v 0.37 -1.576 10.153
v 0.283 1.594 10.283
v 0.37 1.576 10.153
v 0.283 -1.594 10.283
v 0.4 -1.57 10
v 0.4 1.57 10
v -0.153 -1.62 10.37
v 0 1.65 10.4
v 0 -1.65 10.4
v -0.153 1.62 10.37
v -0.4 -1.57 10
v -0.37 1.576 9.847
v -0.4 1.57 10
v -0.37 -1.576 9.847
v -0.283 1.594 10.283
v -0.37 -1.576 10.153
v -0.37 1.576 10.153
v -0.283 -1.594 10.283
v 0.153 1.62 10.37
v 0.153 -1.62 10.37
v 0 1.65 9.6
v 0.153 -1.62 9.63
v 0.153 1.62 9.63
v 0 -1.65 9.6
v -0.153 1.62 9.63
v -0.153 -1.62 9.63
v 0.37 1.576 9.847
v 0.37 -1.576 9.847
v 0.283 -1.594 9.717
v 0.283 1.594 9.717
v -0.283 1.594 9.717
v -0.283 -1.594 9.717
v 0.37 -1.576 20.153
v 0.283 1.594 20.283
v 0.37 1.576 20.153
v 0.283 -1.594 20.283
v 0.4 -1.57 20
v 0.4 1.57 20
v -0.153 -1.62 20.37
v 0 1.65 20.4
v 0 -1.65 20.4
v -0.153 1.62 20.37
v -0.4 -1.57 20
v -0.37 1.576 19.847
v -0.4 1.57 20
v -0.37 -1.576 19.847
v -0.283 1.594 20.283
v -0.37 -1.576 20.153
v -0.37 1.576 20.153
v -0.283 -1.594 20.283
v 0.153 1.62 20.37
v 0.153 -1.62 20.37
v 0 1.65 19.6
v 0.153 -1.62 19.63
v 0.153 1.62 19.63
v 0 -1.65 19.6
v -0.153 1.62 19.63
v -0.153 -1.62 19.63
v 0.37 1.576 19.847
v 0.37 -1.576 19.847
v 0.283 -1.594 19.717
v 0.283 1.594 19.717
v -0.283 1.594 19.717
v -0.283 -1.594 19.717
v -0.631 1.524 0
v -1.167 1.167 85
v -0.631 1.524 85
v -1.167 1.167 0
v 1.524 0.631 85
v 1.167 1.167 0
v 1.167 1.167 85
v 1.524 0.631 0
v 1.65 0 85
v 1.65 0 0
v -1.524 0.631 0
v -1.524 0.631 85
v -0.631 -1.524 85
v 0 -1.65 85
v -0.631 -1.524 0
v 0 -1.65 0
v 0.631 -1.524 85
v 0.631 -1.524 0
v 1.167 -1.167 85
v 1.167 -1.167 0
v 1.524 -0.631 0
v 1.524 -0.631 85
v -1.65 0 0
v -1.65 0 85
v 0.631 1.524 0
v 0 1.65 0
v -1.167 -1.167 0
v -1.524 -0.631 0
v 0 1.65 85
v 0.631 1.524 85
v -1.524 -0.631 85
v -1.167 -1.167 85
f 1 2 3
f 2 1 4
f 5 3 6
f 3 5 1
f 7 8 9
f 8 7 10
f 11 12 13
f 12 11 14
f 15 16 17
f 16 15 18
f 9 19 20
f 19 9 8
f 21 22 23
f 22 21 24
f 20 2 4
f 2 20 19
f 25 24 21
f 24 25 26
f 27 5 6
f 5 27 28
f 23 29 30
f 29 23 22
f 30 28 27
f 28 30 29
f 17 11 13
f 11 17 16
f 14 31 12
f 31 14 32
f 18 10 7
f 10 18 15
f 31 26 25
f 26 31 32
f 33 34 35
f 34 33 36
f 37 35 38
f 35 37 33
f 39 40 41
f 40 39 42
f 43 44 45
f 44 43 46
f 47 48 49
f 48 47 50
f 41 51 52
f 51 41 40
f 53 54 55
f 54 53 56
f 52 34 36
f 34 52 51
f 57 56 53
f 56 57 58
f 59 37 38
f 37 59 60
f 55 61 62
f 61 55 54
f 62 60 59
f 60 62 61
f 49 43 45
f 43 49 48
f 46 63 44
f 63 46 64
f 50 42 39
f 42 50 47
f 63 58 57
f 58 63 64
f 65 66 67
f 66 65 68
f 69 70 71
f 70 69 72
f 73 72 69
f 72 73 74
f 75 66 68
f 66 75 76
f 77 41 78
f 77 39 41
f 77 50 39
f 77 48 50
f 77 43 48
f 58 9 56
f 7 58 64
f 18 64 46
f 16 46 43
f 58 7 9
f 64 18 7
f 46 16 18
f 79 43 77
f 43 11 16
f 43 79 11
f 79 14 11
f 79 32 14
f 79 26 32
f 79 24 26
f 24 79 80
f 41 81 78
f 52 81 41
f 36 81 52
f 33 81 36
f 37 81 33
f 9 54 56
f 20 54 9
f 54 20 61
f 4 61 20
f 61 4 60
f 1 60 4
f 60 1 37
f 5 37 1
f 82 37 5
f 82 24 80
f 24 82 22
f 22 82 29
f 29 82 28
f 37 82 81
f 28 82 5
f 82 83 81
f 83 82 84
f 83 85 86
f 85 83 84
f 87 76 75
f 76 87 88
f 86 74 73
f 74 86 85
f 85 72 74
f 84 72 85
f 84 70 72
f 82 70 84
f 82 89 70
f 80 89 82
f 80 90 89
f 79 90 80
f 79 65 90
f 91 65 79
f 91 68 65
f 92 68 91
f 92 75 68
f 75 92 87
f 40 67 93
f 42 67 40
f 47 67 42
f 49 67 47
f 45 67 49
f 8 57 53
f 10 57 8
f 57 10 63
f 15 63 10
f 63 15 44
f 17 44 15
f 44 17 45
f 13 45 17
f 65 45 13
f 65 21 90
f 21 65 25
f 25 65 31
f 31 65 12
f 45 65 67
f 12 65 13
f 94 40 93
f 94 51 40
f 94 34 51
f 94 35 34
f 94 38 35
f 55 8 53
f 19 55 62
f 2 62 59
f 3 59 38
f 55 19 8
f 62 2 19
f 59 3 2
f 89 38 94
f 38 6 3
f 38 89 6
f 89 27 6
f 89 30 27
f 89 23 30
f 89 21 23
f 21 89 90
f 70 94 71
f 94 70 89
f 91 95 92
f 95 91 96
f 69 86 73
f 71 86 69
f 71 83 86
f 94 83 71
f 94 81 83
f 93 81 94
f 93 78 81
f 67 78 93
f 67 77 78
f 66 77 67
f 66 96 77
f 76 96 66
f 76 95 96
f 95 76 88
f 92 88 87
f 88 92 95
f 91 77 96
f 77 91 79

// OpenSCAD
// file: hdim.scad
module hdim(x1 = 10, x2 = 20, y = 10, dimline_lenght = 9.0) 
{
    dimline_overlap = 0.5;
    dimline_width = 0.3;
    text_size = 2;
    tmp = 2*dimline_overlap+text_size/2;
    text_pos = dimline_lenght>0 ? tmp : -tmp; 
    dimline_abs = dimline_lenght>0 ? dimline_lenght : -dimline_lenght;
    
    color([0,0,0.6,1])
    {
        translate([x1,y-dimline_lenght/2,0]) 
            square([dimline_width, 
                dimline_abs + 2*dimline_overlap], 
                center=true, $fs=0.01);
                
        translate([x2,y-dimline_lenght/2,0]) 
            square([dimline_width, 
                dimline_abs + 2*dimline_overlap], 
                center=true, $fs=0.01);

        translate([(x1+x2)/2,y-dimline_lenght,0]) 
            square([x2-x1, 
                dimline_width], 
                center=true, $fs=0.01);
    }
        
    translate([(x1+x2)/2,y-dimline_lenght-text_pos,0]) 
    {
        color([0,0,0.6,1])
        cube([text_size * 5, 1.2*text_size, 0.9], center=true);
        
        color([0.8,0.8,0.5,1.0])
        {
            txt2 = round_dec(x2-x1);
            translate([0,0,0.2])
            text(txt2, size = text_size, 
                halign = "center",valign = "center");
            translate([0,0,-0.2])
            rotate([0,180,0])
            text(txt2, size = text_size, 
                halign = "center",valign = "center");
        }
    }
}

function round_dec(x) =
 ((search(".", str(0.1*round((x)*10))) == []) ? str(str(0.1*round((x)*10)), ".0") : str(0.1*round((x)*10)));

hdim();
// main file
use <hdim.scad>

module pipe(pipe_length = 85, pipe_diam=3.3, pipe_hole_pos=[10,20], n_holes = 2)
{
    bolt_hole_diam = 0.8;
    
    difference()
    {
        translate([0, 0, pipe_length/2])
        color([0.23,0.12,0.10, 1.0])
        cylinder(h=pipe_length,r=pipe_diam/2,center = true, $fn = 16);

        for (x = [0: n_holes-1]) {
            translate([0,0,pipe_hole_pos[x]])
            rotate([90,0,0])
            cylinder(h=pipe_diam+1.0,r=bolt_hole_diam/2,center = true, $fn = 16);
        }
    }
    
    rotate([0,90,0])
    hdim(-pipe_length, 0, -2, 22);

    for (x = [0: n_holes-1]) {
        //translate([0,0,pipe_hole_pos[x]])
        rotate([0,-90,n_holes==4?-90:90])
        hdim(0, pipe_hole_pos[x], 0, x*5 + 7);
    }
}   

pipe();
